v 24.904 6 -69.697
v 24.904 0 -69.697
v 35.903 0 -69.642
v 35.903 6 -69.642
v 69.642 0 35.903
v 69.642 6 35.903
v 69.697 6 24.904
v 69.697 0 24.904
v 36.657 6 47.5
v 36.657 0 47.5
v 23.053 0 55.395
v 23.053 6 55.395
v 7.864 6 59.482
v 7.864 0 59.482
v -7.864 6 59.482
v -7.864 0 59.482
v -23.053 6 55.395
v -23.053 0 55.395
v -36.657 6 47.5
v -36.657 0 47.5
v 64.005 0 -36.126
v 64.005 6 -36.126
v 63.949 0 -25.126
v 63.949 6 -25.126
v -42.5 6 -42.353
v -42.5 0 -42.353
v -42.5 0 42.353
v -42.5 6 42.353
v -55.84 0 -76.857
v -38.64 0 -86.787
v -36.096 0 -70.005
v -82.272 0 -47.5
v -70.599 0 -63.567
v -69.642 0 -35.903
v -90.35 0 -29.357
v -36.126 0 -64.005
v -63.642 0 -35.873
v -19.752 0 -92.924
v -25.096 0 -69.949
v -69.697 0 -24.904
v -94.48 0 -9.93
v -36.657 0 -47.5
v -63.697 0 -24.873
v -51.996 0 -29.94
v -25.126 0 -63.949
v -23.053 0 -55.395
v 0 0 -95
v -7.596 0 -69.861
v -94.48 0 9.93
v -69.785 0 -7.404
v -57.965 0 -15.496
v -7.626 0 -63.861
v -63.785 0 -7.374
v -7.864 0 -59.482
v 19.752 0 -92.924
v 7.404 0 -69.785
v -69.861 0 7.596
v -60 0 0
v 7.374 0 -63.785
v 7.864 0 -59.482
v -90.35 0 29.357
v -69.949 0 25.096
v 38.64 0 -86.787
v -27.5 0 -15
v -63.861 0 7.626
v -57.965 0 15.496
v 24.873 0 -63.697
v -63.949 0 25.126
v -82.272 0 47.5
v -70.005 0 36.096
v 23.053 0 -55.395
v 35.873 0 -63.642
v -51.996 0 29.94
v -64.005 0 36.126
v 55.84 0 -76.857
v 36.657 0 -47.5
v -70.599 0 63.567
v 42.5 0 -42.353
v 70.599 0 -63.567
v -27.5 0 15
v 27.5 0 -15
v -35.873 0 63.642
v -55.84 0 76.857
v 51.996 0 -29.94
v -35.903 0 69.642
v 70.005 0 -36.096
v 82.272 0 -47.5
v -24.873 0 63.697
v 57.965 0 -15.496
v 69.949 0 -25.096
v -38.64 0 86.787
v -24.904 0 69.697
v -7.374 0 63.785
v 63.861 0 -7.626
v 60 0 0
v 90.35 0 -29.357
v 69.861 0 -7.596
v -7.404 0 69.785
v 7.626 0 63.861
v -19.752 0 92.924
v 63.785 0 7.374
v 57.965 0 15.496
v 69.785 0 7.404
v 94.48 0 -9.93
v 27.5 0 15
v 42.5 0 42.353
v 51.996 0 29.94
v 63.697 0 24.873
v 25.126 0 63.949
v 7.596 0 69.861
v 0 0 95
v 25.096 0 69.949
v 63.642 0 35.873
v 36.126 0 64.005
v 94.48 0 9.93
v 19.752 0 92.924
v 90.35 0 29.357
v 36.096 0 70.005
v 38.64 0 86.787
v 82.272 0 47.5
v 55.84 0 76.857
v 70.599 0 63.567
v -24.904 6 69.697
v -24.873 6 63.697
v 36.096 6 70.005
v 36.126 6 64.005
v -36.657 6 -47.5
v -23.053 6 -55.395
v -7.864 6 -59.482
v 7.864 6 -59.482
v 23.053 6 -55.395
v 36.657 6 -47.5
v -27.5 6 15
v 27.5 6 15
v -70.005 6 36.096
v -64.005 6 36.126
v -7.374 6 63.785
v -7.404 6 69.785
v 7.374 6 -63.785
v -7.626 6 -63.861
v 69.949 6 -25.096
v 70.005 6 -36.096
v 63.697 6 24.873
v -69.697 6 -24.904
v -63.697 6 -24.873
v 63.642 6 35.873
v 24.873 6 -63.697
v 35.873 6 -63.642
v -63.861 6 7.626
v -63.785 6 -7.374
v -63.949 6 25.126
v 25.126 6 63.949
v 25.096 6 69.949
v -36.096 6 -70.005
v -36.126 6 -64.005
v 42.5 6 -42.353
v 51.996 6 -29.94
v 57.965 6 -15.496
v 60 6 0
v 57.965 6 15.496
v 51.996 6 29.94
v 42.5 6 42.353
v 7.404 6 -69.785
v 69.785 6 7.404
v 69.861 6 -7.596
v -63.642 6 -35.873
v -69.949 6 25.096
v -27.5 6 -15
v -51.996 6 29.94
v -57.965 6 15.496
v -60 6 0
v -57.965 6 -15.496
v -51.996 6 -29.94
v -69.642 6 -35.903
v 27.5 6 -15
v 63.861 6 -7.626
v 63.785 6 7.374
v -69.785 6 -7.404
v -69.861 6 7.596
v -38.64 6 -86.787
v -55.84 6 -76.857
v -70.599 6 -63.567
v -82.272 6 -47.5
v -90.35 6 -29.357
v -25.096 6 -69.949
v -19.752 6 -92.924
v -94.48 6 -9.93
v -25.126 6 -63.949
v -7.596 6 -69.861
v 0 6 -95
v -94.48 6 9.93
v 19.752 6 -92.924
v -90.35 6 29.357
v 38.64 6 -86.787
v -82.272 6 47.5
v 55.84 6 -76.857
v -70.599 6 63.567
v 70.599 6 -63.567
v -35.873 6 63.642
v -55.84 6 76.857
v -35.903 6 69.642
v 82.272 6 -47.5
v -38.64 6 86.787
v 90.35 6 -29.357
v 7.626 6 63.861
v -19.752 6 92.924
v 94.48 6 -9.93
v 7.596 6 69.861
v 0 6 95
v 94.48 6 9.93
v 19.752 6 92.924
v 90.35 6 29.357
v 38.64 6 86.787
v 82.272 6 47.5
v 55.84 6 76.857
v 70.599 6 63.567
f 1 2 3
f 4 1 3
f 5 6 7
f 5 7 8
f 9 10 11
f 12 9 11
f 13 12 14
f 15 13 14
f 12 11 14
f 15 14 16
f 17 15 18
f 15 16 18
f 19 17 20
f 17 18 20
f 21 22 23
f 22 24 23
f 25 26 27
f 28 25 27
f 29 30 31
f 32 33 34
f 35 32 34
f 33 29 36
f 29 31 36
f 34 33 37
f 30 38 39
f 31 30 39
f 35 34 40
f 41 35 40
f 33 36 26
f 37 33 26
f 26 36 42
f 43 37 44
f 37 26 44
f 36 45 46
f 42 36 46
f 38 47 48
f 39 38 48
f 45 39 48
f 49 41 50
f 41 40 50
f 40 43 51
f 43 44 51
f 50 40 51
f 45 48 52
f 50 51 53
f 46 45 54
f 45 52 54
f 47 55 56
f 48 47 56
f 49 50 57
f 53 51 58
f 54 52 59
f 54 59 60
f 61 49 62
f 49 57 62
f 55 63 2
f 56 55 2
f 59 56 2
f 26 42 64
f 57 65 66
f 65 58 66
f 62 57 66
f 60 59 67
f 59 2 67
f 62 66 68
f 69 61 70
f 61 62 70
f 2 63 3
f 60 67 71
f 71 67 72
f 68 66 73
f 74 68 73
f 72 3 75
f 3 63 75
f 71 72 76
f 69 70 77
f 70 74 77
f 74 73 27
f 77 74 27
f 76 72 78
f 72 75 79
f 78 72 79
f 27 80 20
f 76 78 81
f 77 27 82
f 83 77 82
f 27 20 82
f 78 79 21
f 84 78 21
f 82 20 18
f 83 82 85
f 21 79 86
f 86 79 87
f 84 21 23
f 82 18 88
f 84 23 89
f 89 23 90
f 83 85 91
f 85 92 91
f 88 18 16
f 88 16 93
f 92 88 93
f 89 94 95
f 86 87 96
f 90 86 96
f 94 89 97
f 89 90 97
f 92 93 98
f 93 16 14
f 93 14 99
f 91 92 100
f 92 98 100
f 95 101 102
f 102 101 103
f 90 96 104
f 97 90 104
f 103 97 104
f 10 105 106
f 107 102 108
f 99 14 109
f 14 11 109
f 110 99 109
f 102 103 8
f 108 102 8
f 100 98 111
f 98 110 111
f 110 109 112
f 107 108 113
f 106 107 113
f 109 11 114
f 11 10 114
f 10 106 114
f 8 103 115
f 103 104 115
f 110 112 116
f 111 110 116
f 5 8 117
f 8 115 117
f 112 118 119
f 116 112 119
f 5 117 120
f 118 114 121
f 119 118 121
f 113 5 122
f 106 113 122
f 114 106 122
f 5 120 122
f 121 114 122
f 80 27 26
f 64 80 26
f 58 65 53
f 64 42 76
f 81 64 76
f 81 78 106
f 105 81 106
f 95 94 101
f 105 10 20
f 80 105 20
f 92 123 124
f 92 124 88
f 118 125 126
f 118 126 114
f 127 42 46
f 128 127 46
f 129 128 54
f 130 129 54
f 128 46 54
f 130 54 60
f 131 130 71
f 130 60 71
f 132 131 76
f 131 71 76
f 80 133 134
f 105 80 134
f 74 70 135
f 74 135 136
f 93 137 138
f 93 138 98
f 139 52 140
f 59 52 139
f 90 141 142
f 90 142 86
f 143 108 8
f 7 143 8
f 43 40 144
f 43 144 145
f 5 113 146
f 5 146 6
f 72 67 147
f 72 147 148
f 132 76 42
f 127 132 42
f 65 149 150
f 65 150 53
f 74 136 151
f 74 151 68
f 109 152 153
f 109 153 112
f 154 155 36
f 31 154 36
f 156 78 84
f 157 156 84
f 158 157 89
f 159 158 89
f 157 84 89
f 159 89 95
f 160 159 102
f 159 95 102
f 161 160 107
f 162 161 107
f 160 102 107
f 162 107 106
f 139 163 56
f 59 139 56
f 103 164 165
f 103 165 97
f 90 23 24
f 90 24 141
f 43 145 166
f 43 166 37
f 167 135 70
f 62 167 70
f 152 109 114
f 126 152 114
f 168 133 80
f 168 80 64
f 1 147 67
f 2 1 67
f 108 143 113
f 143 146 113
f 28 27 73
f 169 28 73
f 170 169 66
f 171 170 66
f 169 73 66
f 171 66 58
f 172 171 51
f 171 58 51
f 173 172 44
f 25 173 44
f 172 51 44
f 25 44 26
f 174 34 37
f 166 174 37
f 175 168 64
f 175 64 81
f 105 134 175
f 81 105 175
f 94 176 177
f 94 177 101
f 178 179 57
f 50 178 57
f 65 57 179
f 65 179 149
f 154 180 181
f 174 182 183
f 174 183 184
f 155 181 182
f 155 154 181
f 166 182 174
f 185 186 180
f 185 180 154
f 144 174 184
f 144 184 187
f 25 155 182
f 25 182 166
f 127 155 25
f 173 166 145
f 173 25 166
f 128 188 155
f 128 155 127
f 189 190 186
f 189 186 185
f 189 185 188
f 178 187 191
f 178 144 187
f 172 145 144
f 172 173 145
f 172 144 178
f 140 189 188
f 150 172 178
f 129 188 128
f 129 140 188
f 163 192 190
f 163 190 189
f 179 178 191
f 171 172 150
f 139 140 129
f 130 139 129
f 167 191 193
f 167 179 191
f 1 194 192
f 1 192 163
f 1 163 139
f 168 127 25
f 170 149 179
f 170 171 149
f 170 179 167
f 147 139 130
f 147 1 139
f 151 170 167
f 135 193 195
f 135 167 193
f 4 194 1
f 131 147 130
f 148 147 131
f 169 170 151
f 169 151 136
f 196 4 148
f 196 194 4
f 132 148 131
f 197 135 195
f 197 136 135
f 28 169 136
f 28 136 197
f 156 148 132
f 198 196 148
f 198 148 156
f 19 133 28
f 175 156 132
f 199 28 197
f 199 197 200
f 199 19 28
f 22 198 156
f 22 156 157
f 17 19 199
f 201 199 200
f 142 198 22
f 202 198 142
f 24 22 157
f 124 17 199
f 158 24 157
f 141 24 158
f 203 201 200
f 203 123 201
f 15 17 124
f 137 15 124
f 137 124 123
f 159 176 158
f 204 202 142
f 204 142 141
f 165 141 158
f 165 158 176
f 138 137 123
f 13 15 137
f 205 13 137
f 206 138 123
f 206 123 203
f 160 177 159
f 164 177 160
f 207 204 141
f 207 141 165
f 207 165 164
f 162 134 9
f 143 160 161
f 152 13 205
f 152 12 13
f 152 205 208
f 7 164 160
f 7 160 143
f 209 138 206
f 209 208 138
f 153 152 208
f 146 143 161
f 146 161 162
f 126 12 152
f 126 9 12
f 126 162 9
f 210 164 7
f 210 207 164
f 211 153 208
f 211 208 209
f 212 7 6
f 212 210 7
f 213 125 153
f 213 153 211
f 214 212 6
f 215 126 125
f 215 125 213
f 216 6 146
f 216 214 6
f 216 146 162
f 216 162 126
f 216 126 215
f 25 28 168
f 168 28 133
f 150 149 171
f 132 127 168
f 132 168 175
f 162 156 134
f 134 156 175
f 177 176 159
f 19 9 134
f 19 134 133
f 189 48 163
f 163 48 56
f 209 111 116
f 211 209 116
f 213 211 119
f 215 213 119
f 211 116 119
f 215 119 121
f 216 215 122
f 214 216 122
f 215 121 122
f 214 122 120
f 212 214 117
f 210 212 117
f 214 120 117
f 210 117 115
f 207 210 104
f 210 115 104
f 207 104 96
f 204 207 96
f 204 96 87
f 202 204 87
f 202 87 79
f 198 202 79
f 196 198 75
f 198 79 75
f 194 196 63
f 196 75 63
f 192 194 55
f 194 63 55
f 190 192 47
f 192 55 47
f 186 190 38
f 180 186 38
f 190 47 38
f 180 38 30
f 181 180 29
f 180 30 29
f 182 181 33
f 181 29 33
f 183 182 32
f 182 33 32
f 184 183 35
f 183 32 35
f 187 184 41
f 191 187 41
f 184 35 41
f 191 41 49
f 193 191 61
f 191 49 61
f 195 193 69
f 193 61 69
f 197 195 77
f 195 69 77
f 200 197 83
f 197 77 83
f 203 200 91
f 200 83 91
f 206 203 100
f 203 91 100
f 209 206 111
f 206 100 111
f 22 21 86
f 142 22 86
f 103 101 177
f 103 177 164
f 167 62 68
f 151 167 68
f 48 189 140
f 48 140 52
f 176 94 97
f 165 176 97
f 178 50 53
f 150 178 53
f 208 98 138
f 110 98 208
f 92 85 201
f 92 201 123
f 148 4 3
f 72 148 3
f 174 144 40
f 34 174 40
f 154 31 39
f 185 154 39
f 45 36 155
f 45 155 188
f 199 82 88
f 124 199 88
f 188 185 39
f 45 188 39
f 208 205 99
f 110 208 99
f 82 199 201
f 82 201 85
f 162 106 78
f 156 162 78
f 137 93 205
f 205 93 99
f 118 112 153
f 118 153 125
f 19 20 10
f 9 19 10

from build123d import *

# Parameters (mm, degrees)
SKETCH1_R             = 95
BOSS_EXTRUDE1_DEPTH   = 6
SKETCH2_W             = 55
SKETCH2_H             = 30
CUT_EXTRUDE1_DEPTH    = 135.484199815
CAVITY1_START         = -69.821849164
CAVITY1_OUTLINE_W     = 15
CAVITY1_OUTLINE_H     = 6
CAVITY1_OUTLINE_W_2   = 11
CAVITY1_DEPTH         = 6
CAVITY1_START_2       = 63.821772898
CAVITY1_2_OUTLINE_W   = 11
CAVITY1_2_OUTLINE_H   = 6
CAVITY1_2_OUTLINE_W_2 = 15
CAVITY1_2_DEPTH       = 6
CAVITY1_START_3       = -7.051829773
CAVITY1_3_OUTLINE_W   = 6
CAVITY1_3_OUTLINE_H   = 6
CAVITY1_3_DEPTH       = 14.103659546
CAVITY1_START_4       = -35.551829773
CAVITY1_4_OUTLINE_W   = 6
CAVITY1_4_OUTLINE_H   = 6
CAVITY1_4_DEPTH       = 10.103659546
CAVITY1_START_5       = 25.448170227
CAVITY1_5_OUTLINE_W   = 6
CAVITY1_5_OUTLINE_H   = 6
CAVITY1_5_DEPTH       = 10.103659546
CAVITY1_START_6       = -36.448170227
CAVITY1_6_OUTLINE_W   = 6
CAVITY1_6_OUTLINE_H   = 6
CAVITY1_6_DEPTH       = 0.896340454
CAVITY1_START_7       = -25.448170227
CAVITY1_7_OUTLINE_W   = 6
CAVITY1_7_OUTLINE_H   = 6
CAVITY1_7_DEPTH       = 0.896340454
CAVITY1_START_8       = -7.948170227
CAVITY1_8_OUTLINE_W   = 6
CAVITY1_8_OUTLINE_H   = 6
CAVITY1_8_DEPTH       = 0.896340454
CAVITY1_START_9       = 7.051829773
CAVITY1_9_OUTLINE_W   = 6
CAVITY1_9_OUTLINE_H   = 6
CAVITY1_9_DEPTH       = 0.896340454
CAVITY1_START_10      = 24.551829773
CAVITY1_10_OUTLINE_W  = 6
CAVITY1_10_OUTLINE_H  = 6
CAVITY1_10_DEPTH      = 0.896340454
CAVITY1_START_11      = 35.551829773
CAVITY1_11_OUTLINE_W  = 6
CAVITY1_11_OUTLINE_H  = 6
CAVITY1_11_DEPTH      = 0.896340454


# Read off the part's stored shape, not the designer's step: Cavity1
with BuildPart() as part:
    # Sketch1 → Boss-Extrude1 (new body)
    with BuildSketch(Plane(origin=(0, 0, 0), x_dir=(1, 0, 0), z_dir=(0, 1, 0))):
        with Locations(Location((0, 0, 0), (0, 0, 270))):
            Circle(SKETCH1_R)
        with BuildLine():
            Line((-36.657195747, -47.5), (36.657195747, -47.5))
            ThreePointArc((36.657195747, -47.5), (0, -60), (-36.657195747, -47.5))
        make_face(mode=Mode.SUBTRACT)
        with BuildLine():
            Line((-42.5, 42.352685865), (-42.5, -42.352685865))
            ThreePointArc((-42.5, -42.352685865), (-60, 0), (-42.5, 42.352685865))
        make_face(mode=Mode.SUBTRACT)
        with BuildLine():
            Line((36.657195747, 47.5), (-36.657195747, 47.5))
            ThreePointArc((-36.657195747, 47.5), (0, 60), (36.657195747, 47.5))
        make_face(mode=Mode.SUBTRACT)
        with BuildLine():
            Line((42.5, -42.352685865), (42.5, 42.352685865))
            ThreePointArc((42.5, 42.352685865), (60, 0), (42.5, -42.352685865))
        make_face(mode=Mode.SUBTRACT)
    extrude(amount=BOSS_EXTRUDE1_DEPTH)

    # Sketch2 → Cut-Extrude1 (cut, through all)
    with BuildSketch(Plane(origin=(0, 6, 0), x_dir=(1, 0, 0), z_dir=(0, 1, 0))):
        Rectangle(SKETCH2_W, SKETCH2_H)
    extrude(amount=-CUT_EXTRUDE1_DEPTH, mode=Mode.SUBTRACT)

    # Cavity1 outline → Cavity1 (cut)
    with BuildSketch(Plane(origin=(0, 0, 0), x_dir=(0.9999872892756082, 0, 0.005041952719030872), z_dir=(0.005041952719030872, 0, -0.9999872892756083)).offset(CAVITY1_START)):
        with Locations((0.448170227, -3)):
            Rectangle(CAVITY1_OUTLINE_W, CAVITY1_OUTLINE_H)
        with Locations((30.948170227, -3)):
            Rectangle(CAVITY1_OUTLINE_W_2, CAVITY1_OUTLINE_H)
        with Locations((-30.051829773, -3)):
            Rectangle(CAVITY1_OUTLINE_W_2, CAVITY1_OUTLINE_H)
    extrude(amount=CAVITY1_DEPTH, mode=Mode.SUBTRACT)

    # Cavity1 2 outline → Cavity1 2 (cut)
    with BuildSketch(Plane(origin=(0, 0, 0), x_dir=(0.9999872892756082, 0, 0.005041952719030872), z_dir=(0.005041952719030872, 0, -0.9999872892756083)).offset(CAVITY1_START_2)):
        with Locations((30.051829773, -3)):
            Rectangle(CAVITY1_2_OUTLINE_W, CAVITY1_2_OUTLINE_H)
        with Locations((-0.448170227, -3)):
            Rectangle(CAVITY1_2_OUTLINE_W_2, CAVITY1_2_OUTLINE_H)
        with Locations((-30.948170227, -3)):
            Rectangle(CAVITY1_2_OUTLINE_W, CAVITY1_2_OUTLINE_H)
    extrude(amount=CAVITY1_2_DEPTH, mode=Mode.SUBTRACT)

    # Cavity1 3 outline → Cavity1 3 (cut)
    with BuildSketch(Plane(origin=(0, 0, 0), x_dir=(0.9999872892756082, 0, 0.005041952719030872), z_dir=(0.005041952719030872, 0, -0.9999872892756083)).offset(CAVITY1_START_3)):
        with Locations((66.821849164, -3)):
            Rectangle(CAVITY1_3_OUTLINE_W, CAVITY1_3_OUTLINE_H)
        with Locations((-66.821849164, -3)):
            Rectangle(CAVITY1_3_OUTLINE_W, CAVITY1_3_OUTLINE_H)
    extrude(amount=CAVITY1_3_DEPTH, mode=Mode.SUBTRACT)

    # Cavity1 4 outline → Cavity1 4 (cut)
    with BuildSketch(Plane(origin=(0, 0, 0), x_dir=(0.9999872892756082, 0, 0.005041952719030872), z_dir=(0.005041952719030872, 0, -0.9999872892756083)).offset(CAVITY1_START_4)):
        with Locations((66.821849164, -3)):
            Rectangle(CAVITY1_4_OUTLINE_W, CAVITY1_4_OUTLINE_H)
        with Locations((-66.821849164, -3)):
            Rectangle(CAVITY1_4_OUTLINE_W, CAVITY1_4_OUTLINE_H)
    extrude(amount=CAVITY1_4_DEPTH, mode=Mode.SUBTRACT)

    # Cavity1 5 outline → Cavity1 5 (cut)
    with BuildSketch(Plane(origin=(0, 0, 0), x_dir=(0.9999872892756082, 0, 0.005041952719030872), z_dir=(0.005041952719030872, 0, -0.9999872892756083)).offset(CAVITY1_START_5)):
        with Locations((66.821849164, -3)):
            Rectangle(CAVITY1_5_OUTLINE_W, CAVITY1_5_OUTLINE_H)
        with Locations((-66.821849164, -3)):
            Rectangle(CAVITY1_5_OUTLINE_W, CAVITY1_5_OUTLINE_H)
    extrude(amount=CAVITY1_5_DEPTH, mode=Mode.SUBTRACT)

    # Cavity1 6 outline → Cavity1 6 (cut)
    with BuildSketch(Plane(origin=(0, 0, 0), x_dir=(0.9999872892756082, 0, 0.005041952719030872), z_dir=(0.005041952719030872, 0, -0.9999872892756083)).offset(CAVITY1_START_6)):
        with Locations((-66.821849164, -3)):
            Rectangle(CAVITY1_6_OUTLINE_W, CAVITY1_6_OUTLINE_H)
    extrude(amount=CAVITY1_6_DEPTH, mode=Mode.SUBTRACT)

    # Cavity1 7 outline → Cavity1 7 (cut)
    with BuildSketch(Plane(origin=(0, 0, 0), x_dir=(0.9999872892756082, 0, 0.005041952719030872), z_dir=(0.005041952719030872, 0, -0.9999872892756083)).offset(CAVITY1_START_7)):
        with Locations((66.821849164, -3)):
            Rectangle(CAVITY1_7_OUTLINE_W, CAVITY1_7_OUTLINE_H)
    extrude(amount=CAVITY1_7_DEPTH, mode=Mode.SUBTRACT)

    # Cavity1 8 outline → Cavity1 8 (cut)
    with BuildSketch(Plane(origin=(0, 0, 0), x_dir=(0.9999872892756082, 0, 0.005041952719030872), z_dir=(0.005041952719030872, 0, -0.9999872892756083)).offset(CAVITY1_START_8)):
        with Locations((-66.821849164, -3)):
            Rectangle(CAVITY1_8_OUTLINE_W, CAVITY1_8_OUTLINE_H)
    extrude(amount=CAVITY1_8_DEPTH, mode=Mode.SUBTRACT)

    # Cavity1 9 outline → Cavity1 9 (cut)
    with BuildSketch(Plane(origin=(0, 0, 0), x_dir=(0.9999872892756082, 0, 0.005041952719030872), z_dir=(0.005041952719030872, 0, -0.9999872892756083)).offset(CAVITY1_START_9)):
        with Locations((66.821849164, -3)):
            Rectangle(CAVITY1_9_OUTLINE_W, CAVITY1_9_OUTLINE_H)
    extrude(amount=CAVITY1_9_DEPTH, mode=Mode.SUBTRACT)

    # Cavity1 10 outline → Cavity1 10 (cut)
    with BuildSketch(Plane(origin=(0, 0, 0), x_dir=(0.9999872892756082, 0, 0.005041952719030872), z_dir=(0.005041952719030872, 0, -0.9999872892756083)).offset(CAVITY1_START_10)):
        with Locations((-66.821849164, -3)):
            Rectangle(CAVITY1_10_OUTLINE_W, CAVITY1_10_OUTLINE_H)
    extrude(amount=CAVITY1_10_DEPTH, mode=Mode.SUBTRACT)

    # Cavity1 11 outline → Cavity1 11 (cut)
    with BuildSketch(Plane(origin=(0, 0, 0), x_dir=(0.9999872892756082, 0, 0.005041952719030872), z_dir=(0.005041952719030872, 0, -0.9999872892756083)).offset(CAVITY1_START_11)):
        with Locations((66.821849164, -3)):
            Rectangle(CAVITY1_11_OUTLINE_W, CAVITY1_11_OUTLINE_H)
    extrude(amount=CAVITY1_11_DEPTH, mode=Mode.SUBTRACT)


solid = part.part
